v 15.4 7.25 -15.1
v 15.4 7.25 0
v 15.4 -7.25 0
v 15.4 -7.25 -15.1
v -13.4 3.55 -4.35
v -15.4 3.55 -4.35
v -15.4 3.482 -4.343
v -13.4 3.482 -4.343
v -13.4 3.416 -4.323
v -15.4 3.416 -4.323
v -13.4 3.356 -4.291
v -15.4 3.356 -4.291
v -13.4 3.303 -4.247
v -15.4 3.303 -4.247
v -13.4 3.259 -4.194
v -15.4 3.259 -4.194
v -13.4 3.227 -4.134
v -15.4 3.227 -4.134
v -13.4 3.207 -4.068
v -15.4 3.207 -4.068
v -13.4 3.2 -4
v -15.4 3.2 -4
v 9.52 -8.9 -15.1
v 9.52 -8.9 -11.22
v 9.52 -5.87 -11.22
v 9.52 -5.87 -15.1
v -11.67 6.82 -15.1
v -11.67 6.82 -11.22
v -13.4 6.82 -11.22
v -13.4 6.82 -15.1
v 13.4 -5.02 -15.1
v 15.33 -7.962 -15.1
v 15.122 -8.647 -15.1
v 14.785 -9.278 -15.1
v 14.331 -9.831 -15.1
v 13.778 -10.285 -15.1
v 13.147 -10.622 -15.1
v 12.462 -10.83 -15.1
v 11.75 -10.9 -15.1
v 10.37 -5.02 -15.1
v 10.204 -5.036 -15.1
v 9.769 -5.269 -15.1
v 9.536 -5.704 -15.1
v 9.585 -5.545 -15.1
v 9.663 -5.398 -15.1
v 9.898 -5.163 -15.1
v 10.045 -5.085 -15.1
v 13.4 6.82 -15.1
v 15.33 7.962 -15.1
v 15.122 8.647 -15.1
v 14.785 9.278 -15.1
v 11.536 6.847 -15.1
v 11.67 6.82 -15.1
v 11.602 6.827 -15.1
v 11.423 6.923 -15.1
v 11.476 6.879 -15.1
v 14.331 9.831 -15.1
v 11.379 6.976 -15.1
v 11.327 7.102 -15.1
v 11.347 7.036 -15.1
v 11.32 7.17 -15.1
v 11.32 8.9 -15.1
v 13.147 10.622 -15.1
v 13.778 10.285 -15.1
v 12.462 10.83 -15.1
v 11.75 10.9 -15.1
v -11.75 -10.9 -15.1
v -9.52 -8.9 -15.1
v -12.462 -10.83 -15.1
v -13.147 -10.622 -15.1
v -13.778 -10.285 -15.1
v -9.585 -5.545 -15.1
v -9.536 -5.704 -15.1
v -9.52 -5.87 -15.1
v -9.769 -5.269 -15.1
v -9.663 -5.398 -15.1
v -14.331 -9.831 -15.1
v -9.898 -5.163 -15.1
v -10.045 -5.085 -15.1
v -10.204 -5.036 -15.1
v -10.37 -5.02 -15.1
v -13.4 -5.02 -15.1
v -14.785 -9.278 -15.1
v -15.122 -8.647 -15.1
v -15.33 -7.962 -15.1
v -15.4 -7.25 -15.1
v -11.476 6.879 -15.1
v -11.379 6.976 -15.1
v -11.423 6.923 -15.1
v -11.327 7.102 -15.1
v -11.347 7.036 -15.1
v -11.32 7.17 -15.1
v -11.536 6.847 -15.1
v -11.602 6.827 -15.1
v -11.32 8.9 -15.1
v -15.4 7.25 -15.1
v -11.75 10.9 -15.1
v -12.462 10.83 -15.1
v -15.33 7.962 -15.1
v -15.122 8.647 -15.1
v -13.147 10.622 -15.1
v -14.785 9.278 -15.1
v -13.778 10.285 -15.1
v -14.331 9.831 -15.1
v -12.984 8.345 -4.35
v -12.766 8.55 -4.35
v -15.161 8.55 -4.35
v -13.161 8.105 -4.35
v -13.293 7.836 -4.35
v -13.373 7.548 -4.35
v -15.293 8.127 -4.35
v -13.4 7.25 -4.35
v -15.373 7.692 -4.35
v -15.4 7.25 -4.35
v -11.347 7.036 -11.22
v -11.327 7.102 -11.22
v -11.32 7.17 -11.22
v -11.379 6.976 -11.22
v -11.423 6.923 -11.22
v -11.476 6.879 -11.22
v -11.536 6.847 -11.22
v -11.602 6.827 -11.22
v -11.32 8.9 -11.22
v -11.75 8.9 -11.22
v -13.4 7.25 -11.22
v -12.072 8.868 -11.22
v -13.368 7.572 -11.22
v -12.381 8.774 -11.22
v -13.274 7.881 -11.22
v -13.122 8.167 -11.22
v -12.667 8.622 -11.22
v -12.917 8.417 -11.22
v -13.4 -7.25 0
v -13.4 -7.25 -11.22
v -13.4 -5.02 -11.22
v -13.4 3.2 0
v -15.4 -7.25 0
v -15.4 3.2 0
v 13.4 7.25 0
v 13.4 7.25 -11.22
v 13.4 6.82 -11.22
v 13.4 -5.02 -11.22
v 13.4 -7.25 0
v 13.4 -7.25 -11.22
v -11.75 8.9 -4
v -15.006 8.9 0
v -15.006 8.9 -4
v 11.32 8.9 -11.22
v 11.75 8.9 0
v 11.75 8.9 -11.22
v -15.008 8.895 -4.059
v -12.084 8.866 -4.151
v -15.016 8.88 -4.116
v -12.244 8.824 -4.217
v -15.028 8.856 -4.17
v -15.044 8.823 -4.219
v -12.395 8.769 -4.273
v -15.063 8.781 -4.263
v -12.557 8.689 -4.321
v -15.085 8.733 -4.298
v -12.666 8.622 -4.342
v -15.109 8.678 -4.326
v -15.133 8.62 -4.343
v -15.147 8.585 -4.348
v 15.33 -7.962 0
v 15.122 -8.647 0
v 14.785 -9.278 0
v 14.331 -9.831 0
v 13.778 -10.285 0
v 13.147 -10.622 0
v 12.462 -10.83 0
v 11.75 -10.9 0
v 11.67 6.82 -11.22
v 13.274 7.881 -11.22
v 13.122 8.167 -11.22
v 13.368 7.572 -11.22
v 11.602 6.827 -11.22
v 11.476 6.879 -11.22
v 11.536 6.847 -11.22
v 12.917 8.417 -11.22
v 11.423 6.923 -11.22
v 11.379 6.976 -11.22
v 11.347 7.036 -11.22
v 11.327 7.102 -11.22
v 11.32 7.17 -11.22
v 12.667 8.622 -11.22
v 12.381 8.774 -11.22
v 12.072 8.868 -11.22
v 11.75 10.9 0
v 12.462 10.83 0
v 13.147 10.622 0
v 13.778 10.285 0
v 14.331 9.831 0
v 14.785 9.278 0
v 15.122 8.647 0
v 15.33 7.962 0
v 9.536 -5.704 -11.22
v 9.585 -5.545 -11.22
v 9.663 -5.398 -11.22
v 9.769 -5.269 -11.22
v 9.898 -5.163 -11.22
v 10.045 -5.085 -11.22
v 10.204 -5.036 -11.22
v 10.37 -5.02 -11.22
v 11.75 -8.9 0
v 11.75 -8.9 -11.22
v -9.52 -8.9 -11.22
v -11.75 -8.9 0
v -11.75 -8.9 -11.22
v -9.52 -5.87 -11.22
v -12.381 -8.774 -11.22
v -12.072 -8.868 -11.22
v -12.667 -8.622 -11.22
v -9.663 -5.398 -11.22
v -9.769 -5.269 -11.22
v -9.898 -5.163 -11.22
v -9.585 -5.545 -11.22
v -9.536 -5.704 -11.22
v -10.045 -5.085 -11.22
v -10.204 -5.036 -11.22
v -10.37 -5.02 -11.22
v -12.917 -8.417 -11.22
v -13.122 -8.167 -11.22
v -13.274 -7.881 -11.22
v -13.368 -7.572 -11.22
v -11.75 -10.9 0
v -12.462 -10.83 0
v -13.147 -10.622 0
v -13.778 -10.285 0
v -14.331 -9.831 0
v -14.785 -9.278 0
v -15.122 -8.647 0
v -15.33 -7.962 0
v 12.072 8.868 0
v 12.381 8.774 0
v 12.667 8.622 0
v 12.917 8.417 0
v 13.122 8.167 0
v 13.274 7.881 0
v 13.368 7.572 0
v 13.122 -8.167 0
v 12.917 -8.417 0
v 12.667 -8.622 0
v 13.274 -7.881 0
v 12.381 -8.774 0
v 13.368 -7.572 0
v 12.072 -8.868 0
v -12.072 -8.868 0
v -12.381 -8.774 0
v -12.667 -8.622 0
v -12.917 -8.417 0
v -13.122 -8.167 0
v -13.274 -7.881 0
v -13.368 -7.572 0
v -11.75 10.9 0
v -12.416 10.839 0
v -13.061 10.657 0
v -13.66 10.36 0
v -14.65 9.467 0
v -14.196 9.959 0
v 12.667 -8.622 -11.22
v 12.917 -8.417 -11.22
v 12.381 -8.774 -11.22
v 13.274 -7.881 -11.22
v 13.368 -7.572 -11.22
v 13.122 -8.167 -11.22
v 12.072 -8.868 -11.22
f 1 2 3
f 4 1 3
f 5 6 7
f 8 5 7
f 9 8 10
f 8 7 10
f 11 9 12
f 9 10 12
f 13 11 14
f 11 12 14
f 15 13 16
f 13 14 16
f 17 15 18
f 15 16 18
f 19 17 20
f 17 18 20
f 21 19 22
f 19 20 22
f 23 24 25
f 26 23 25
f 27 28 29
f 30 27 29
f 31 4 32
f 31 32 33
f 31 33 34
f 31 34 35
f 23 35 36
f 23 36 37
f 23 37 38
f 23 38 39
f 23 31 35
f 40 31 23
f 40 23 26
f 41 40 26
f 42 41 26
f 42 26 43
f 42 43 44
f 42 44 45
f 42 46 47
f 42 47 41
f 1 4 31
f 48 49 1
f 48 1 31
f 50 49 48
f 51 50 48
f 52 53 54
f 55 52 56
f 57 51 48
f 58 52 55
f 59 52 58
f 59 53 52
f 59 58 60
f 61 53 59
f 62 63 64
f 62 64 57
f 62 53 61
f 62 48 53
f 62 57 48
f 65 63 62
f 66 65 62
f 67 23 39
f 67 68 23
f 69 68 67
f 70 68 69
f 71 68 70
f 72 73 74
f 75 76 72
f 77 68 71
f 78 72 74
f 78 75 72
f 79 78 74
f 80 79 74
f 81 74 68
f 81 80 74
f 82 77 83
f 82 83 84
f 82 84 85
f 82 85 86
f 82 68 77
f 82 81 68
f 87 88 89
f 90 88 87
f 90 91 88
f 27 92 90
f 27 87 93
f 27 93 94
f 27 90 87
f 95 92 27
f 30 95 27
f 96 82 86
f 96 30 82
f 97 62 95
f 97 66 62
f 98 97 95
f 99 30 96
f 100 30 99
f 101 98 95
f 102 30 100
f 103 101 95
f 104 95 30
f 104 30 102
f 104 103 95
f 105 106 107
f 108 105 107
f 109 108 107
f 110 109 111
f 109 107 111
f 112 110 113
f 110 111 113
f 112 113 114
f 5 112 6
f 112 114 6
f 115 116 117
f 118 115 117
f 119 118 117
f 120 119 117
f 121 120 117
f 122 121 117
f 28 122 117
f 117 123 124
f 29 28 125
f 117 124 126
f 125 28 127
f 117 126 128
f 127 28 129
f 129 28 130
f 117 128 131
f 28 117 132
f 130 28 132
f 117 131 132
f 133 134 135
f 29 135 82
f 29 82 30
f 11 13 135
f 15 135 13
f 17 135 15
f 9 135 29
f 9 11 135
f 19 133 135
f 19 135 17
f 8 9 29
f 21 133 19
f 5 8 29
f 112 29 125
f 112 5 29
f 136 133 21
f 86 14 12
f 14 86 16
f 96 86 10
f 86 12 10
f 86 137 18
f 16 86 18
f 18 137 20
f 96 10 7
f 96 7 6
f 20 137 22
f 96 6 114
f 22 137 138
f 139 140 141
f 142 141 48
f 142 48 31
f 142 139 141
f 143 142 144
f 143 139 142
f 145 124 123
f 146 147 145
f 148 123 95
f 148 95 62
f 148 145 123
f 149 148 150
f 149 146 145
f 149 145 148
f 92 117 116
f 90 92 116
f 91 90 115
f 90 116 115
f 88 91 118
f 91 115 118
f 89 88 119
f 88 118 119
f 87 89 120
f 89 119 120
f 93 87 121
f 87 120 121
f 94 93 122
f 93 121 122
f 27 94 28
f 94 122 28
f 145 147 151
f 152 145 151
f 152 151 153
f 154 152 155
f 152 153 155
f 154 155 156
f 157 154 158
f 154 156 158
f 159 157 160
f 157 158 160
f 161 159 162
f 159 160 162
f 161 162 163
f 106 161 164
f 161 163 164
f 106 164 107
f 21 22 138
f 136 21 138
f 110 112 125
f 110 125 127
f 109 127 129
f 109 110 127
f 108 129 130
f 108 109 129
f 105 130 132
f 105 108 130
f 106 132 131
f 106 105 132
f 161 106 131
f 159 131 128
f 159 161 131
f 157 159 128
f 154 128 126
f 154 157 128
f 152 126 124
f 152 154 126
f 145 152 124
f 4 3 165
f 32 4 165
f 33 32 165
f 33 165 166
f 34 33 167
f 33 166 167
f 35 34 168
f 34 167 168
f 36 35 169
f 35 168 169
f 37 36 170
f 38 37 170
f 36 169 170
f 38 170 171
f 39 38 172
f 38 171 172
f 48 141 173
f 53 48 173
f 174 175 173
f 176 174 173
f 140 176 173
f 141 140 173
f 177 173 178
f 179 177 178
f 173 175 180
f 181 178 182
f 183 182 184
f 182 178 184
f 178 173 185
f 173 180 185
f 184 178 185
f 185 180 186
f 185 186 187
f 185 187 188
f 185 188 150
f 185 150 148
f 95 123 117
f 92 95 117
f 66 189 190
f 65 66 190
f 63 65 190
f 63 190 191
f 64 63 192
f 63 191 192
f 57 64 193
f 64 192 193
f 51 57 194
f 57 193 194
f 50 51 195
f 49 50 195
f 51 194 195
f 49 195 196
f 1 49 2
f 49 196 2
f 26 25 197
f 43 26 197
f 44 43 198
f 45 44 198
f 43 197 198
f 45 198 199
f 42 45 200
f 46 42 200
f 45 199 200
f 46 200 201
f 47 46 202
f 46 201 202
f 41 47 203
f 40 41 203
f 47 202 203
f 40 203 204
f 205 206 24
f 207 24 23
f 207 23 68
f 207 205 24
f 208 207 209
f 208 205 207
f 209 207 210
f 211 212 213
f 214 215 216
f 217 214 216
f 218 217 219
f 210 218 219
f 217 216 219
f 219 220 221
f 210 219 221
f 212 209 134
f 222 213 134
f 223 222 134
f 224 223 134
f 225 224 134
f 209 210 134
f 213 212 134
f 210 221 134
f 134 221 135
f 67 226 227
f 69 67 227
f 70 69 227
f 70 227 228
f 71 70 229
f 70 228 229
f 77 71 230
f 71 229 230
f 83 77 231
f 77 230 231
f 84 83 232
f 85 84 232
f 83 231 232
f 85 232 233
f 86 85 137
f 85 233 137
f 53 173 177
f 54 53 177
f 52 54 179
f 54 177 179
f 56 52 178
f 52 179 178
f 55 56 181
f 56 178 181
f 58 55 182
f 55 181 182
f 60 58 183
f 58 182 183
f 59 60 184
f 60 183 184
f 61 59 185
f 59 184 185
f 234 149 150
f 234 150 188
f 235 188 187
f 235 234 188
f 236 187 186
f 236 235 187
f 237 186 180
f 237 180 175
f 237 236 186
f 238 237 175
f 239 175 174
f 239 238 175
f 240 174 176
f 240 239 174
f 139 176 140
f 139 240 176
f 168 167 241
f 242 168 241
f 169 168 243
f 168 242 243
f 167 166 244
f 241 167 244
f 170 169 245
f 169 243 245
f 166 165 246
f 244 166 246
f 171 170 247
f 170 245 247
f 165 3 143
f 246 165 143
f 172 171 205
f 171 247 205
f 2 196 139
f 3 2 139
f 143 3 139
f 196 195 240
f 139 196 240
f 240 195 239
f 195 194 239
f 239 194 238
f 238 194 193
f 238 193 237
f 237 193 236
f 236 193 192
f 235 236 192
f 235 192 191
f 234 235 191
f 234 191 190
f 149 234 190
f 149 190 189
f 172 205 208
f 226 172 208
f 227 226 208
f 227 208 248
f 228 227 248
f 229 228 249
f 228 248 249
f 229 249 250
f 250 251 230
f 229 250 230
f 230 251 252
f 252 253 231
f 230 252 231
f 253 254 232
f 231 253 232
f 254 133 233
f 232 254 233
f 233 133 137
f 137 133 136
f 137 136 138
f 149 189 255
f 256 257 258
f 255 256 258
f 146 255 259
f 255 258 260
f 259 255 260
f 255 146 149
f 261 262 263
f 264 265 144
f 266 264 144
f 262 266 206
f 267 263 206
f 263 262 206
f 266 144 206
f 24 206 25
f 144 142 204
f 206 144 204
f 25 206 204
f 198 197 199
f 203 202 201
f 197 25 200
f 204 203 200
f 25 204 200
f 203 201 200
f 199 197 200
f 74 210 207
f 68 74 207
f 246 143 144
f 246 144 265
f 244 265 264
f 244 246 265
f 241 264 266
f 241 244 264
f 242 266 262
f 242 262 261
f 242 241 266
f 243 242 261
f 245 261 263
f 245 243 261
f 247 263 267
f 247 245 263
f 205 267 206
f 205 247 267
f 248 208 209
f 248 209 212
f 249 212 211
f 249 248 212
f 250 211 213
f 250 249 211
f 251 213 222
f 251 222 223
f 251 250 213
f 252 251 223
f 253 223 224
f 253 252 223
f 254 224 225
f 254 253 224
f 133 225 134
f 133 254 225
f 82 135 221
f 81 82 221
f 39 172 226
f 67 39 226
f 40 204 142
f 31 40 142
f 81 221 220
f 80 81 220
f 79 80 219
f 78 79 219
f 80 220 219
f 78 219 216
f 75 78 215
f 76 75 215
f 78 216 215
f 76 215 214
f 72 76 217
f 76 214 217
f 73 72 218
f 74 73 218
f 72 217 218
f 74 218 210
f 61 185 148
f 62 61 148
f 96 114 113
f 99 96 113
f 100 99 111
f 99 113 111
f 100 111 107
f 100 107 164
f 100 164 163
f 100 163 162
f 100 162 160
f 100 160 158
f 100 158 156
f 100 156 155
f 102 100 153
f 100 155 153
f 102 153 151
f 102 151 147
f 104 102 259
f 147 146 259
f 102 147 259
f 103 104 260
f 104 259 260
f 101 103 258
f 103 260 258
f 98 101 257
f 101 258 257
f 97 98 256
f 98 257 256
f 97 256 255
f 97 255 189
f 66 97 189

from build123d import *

# Parameters (mm, degrees)
EXTRUDE_1_DEPTH     = 15.1
EXTRUDE_START       = -3.88
EXTRUDE_2_DEPTH     = 3.88
CUT_EXTRUDE_1_REACH = 37.992


with BuildPart() as part:
    # 草图1 → 凸台-拉伸1 (new body)
    with BuildSketch(Plane.XY):
        with BuildLine():
            Line((-15.4, 3.2), (-15.4, 7.25))
            ThreePointArc((-15.4, 7.25), (-14.330939751, 9.830939751), (-11.75, 10.9))
            Line((-11.75, 10.9), (11.75, 10.9))
            ThreePointArc((11.75, 10.9), (14.330939751, 9.830939751), (15.4, 7.25))
            Line((15.4, 7.25), (15.4, -7.25))
            ThreePointArc((15.4, -7.25), (14.330939751, -9.830939751), (11.75, -10.9))
            Line((11.75, -10.9), (3.85, -10.9))
            Line((3.85, -10.9), (-3.85, -10.9))
            Line((-3.85, -10.9), (-11.75, -10.9))
            ThreePointArc((-11.75, -10.9), (-14.330939751, -9.830939751), (-15.4, -7.25))
            Line((-15.4, -7.25), (-15.4, 3.2))
        make_face()
        with BuildLine():
            Line((-13.4, 3.2), (-13.4, 7.25))
            ThreePointArc((-13.4, 7.25), (-12.916726189, 8.416726189), (-11.75, 8.9))
            Line((-11.75, 8.9), (11.75, 8.9))
            ThreePointArc((11.75, 8.9), (12.916726189, 8.416726189), (13.4, 7.25))
            Line((13.4, 7.25), (13.4, -7.25))
            ThreePointArc((13.4, -7.25), (12.916726189, -8.416726189), (11.75, -8.9))
            Line((11.75, -8.9), (3.85, -8.9))
            Line((3.85, -8.9), (-3.85, -8.9))
            Line((-3.85, -8.9), (-11.75, -8.9))
            ThreePointArc((-11.75, -8.9), (-12.916726189, -8.416726189), (-13.4, -7.25))
            Line((-13.4, -7.25), (-13.4, 3.2))
        make_face(mode=Mode.SUBTRACT)
    extrude(amount=-EXTRUDE_1_DEPTH)

    # 草图2 → 凸台-拉伸2 (add)
    with BuildSketch(Plane(origin=(0, 0, -15.1), x_dir=(-1, 0, 0), z_dir=(0, 0, -1)).offset(EXTRUDE_START)):
        with BuildLine():
            Line((-13.4, 6.82), (-13.25, 6.82))
            Line((-13.25, 6.82), (-11.67, 6.82))
            ThreePointArc((-11.67, 6.82), (-11.422512627, 6.922512627), (-11.32, 7.17))
            Line((-11.32, 7.17), (-11.32, 8.75))
            Line((-11.32, 8.75), (-11.32, 8.9))
            Line((-11.32, 8.9), (-11.75, 8.9))
            ThreePointArc((-11.75, 8.9), (-12.916726189, 8.416726189), (-13.4, 7.25))
            Line((-13.4, 7.25), (-13.4, 6.82))
        make_face()
        with BuildLine():
            Line((-13.25, -5.02), (-13.4, -5.02))
            Line((-13.4, -5.02), (-13.4, -7.25))
            ThreePointArc((-13.4, -7.25), (-12.916726189, -8.416726189), (-11.75, -8.9))
            Line((-11.75, -8.9), (-9.52, -8.9))
            Line((-9.52, -8.9), (-9.52, -8.75))
            Line((-9.52, -8.75), (-9.52, -5.87))
            ThreePointArc((-9.52, -5.87), (-9.768959236, -5.268959236), (-10.37, -5.02))
            Line((-10.37, -5.02), (-13.25, -5.02))
        make_face()
        with BuildLine():
            Line((9.52, -8.75), (9.52, -8.9))
            Line((9.52, -8.9), (11.75, -8.9))
            ThreePointArc((11.75, -8.9), (12.916726189, -8.416726189), (13.4, -7.25))
            Line((13.4, -7.25), (13.4, -5.02))
            Line((13.4, -5.02), (13.25, -5.02))
            Line((13.25, -5.02), (10.37, -5.02))
            ThreePointArc((10.37, -5.02), (9.768959236, -5.268959236), (9.52, -5.87))
            Line((9.52, -5.87), (9.52, -8.75))
        make_face()
        with BuildLine():
            Line((11.75, 8.9), (11.32, 8.9))
            Line((11.32, 8.9), (11.32, 8.75))
            Line((11.32, 8.75), (11.32, 7.17))
            ThreePointArc((11.32, 7.17), (11.422512627, 6.922512627), (11.67, 6.82))
            Line((11.67, 6.82), (13.25, 6.82))
            Line((13.25, 6.82), (13.4, 6.82))
            Line((13.4, 6.82), (13.4, 7.25))
            ThreePointArc((13.4, 7.25), (12.916726189, 8.416726189), (11.75, 8.9))
        make_face()
    extrude(amount=EXTRUDE_2_DEPTH)

    # 草图3 → 切除-拉伸1 (cut, up to next)
    with BuildSketch(Plane.ZY.offset(15.4), mode=Mode.PRIVATE) as cut_extrude_1_sk1:
        with BuildLine():
            Line((0.15, 8.9), (-4, 8.9))
            ThreePointArc((-4, 8.9), (-4.247487373, 8.797487373), (-4.35, 8.55))
            Line((-4.35, 8.55), (-4.35, 3.55))
            ThreePointArc((-4.35, 3.55), (-4.247487373, 3.302512627), (-4, 3.2))
            Line((-4, 3.2), (0.15, 3.2))
            Line((0.15, 3.2), (0.15, 8.9))
        make_face()
    cut_extrude_1_tool1 = extrude(cut_extrude_1_sk1.sketch, amount=-CUT_EXTRUDE_1_REACH, mode=Mode.PRIVATE) & part.part
    add(cut_extrude_1_tool1.solids().sort_by_distance((-15.4, 6.05, -2.095539))[0], mode=Mode.SUBTRACT)


solid = part.part
